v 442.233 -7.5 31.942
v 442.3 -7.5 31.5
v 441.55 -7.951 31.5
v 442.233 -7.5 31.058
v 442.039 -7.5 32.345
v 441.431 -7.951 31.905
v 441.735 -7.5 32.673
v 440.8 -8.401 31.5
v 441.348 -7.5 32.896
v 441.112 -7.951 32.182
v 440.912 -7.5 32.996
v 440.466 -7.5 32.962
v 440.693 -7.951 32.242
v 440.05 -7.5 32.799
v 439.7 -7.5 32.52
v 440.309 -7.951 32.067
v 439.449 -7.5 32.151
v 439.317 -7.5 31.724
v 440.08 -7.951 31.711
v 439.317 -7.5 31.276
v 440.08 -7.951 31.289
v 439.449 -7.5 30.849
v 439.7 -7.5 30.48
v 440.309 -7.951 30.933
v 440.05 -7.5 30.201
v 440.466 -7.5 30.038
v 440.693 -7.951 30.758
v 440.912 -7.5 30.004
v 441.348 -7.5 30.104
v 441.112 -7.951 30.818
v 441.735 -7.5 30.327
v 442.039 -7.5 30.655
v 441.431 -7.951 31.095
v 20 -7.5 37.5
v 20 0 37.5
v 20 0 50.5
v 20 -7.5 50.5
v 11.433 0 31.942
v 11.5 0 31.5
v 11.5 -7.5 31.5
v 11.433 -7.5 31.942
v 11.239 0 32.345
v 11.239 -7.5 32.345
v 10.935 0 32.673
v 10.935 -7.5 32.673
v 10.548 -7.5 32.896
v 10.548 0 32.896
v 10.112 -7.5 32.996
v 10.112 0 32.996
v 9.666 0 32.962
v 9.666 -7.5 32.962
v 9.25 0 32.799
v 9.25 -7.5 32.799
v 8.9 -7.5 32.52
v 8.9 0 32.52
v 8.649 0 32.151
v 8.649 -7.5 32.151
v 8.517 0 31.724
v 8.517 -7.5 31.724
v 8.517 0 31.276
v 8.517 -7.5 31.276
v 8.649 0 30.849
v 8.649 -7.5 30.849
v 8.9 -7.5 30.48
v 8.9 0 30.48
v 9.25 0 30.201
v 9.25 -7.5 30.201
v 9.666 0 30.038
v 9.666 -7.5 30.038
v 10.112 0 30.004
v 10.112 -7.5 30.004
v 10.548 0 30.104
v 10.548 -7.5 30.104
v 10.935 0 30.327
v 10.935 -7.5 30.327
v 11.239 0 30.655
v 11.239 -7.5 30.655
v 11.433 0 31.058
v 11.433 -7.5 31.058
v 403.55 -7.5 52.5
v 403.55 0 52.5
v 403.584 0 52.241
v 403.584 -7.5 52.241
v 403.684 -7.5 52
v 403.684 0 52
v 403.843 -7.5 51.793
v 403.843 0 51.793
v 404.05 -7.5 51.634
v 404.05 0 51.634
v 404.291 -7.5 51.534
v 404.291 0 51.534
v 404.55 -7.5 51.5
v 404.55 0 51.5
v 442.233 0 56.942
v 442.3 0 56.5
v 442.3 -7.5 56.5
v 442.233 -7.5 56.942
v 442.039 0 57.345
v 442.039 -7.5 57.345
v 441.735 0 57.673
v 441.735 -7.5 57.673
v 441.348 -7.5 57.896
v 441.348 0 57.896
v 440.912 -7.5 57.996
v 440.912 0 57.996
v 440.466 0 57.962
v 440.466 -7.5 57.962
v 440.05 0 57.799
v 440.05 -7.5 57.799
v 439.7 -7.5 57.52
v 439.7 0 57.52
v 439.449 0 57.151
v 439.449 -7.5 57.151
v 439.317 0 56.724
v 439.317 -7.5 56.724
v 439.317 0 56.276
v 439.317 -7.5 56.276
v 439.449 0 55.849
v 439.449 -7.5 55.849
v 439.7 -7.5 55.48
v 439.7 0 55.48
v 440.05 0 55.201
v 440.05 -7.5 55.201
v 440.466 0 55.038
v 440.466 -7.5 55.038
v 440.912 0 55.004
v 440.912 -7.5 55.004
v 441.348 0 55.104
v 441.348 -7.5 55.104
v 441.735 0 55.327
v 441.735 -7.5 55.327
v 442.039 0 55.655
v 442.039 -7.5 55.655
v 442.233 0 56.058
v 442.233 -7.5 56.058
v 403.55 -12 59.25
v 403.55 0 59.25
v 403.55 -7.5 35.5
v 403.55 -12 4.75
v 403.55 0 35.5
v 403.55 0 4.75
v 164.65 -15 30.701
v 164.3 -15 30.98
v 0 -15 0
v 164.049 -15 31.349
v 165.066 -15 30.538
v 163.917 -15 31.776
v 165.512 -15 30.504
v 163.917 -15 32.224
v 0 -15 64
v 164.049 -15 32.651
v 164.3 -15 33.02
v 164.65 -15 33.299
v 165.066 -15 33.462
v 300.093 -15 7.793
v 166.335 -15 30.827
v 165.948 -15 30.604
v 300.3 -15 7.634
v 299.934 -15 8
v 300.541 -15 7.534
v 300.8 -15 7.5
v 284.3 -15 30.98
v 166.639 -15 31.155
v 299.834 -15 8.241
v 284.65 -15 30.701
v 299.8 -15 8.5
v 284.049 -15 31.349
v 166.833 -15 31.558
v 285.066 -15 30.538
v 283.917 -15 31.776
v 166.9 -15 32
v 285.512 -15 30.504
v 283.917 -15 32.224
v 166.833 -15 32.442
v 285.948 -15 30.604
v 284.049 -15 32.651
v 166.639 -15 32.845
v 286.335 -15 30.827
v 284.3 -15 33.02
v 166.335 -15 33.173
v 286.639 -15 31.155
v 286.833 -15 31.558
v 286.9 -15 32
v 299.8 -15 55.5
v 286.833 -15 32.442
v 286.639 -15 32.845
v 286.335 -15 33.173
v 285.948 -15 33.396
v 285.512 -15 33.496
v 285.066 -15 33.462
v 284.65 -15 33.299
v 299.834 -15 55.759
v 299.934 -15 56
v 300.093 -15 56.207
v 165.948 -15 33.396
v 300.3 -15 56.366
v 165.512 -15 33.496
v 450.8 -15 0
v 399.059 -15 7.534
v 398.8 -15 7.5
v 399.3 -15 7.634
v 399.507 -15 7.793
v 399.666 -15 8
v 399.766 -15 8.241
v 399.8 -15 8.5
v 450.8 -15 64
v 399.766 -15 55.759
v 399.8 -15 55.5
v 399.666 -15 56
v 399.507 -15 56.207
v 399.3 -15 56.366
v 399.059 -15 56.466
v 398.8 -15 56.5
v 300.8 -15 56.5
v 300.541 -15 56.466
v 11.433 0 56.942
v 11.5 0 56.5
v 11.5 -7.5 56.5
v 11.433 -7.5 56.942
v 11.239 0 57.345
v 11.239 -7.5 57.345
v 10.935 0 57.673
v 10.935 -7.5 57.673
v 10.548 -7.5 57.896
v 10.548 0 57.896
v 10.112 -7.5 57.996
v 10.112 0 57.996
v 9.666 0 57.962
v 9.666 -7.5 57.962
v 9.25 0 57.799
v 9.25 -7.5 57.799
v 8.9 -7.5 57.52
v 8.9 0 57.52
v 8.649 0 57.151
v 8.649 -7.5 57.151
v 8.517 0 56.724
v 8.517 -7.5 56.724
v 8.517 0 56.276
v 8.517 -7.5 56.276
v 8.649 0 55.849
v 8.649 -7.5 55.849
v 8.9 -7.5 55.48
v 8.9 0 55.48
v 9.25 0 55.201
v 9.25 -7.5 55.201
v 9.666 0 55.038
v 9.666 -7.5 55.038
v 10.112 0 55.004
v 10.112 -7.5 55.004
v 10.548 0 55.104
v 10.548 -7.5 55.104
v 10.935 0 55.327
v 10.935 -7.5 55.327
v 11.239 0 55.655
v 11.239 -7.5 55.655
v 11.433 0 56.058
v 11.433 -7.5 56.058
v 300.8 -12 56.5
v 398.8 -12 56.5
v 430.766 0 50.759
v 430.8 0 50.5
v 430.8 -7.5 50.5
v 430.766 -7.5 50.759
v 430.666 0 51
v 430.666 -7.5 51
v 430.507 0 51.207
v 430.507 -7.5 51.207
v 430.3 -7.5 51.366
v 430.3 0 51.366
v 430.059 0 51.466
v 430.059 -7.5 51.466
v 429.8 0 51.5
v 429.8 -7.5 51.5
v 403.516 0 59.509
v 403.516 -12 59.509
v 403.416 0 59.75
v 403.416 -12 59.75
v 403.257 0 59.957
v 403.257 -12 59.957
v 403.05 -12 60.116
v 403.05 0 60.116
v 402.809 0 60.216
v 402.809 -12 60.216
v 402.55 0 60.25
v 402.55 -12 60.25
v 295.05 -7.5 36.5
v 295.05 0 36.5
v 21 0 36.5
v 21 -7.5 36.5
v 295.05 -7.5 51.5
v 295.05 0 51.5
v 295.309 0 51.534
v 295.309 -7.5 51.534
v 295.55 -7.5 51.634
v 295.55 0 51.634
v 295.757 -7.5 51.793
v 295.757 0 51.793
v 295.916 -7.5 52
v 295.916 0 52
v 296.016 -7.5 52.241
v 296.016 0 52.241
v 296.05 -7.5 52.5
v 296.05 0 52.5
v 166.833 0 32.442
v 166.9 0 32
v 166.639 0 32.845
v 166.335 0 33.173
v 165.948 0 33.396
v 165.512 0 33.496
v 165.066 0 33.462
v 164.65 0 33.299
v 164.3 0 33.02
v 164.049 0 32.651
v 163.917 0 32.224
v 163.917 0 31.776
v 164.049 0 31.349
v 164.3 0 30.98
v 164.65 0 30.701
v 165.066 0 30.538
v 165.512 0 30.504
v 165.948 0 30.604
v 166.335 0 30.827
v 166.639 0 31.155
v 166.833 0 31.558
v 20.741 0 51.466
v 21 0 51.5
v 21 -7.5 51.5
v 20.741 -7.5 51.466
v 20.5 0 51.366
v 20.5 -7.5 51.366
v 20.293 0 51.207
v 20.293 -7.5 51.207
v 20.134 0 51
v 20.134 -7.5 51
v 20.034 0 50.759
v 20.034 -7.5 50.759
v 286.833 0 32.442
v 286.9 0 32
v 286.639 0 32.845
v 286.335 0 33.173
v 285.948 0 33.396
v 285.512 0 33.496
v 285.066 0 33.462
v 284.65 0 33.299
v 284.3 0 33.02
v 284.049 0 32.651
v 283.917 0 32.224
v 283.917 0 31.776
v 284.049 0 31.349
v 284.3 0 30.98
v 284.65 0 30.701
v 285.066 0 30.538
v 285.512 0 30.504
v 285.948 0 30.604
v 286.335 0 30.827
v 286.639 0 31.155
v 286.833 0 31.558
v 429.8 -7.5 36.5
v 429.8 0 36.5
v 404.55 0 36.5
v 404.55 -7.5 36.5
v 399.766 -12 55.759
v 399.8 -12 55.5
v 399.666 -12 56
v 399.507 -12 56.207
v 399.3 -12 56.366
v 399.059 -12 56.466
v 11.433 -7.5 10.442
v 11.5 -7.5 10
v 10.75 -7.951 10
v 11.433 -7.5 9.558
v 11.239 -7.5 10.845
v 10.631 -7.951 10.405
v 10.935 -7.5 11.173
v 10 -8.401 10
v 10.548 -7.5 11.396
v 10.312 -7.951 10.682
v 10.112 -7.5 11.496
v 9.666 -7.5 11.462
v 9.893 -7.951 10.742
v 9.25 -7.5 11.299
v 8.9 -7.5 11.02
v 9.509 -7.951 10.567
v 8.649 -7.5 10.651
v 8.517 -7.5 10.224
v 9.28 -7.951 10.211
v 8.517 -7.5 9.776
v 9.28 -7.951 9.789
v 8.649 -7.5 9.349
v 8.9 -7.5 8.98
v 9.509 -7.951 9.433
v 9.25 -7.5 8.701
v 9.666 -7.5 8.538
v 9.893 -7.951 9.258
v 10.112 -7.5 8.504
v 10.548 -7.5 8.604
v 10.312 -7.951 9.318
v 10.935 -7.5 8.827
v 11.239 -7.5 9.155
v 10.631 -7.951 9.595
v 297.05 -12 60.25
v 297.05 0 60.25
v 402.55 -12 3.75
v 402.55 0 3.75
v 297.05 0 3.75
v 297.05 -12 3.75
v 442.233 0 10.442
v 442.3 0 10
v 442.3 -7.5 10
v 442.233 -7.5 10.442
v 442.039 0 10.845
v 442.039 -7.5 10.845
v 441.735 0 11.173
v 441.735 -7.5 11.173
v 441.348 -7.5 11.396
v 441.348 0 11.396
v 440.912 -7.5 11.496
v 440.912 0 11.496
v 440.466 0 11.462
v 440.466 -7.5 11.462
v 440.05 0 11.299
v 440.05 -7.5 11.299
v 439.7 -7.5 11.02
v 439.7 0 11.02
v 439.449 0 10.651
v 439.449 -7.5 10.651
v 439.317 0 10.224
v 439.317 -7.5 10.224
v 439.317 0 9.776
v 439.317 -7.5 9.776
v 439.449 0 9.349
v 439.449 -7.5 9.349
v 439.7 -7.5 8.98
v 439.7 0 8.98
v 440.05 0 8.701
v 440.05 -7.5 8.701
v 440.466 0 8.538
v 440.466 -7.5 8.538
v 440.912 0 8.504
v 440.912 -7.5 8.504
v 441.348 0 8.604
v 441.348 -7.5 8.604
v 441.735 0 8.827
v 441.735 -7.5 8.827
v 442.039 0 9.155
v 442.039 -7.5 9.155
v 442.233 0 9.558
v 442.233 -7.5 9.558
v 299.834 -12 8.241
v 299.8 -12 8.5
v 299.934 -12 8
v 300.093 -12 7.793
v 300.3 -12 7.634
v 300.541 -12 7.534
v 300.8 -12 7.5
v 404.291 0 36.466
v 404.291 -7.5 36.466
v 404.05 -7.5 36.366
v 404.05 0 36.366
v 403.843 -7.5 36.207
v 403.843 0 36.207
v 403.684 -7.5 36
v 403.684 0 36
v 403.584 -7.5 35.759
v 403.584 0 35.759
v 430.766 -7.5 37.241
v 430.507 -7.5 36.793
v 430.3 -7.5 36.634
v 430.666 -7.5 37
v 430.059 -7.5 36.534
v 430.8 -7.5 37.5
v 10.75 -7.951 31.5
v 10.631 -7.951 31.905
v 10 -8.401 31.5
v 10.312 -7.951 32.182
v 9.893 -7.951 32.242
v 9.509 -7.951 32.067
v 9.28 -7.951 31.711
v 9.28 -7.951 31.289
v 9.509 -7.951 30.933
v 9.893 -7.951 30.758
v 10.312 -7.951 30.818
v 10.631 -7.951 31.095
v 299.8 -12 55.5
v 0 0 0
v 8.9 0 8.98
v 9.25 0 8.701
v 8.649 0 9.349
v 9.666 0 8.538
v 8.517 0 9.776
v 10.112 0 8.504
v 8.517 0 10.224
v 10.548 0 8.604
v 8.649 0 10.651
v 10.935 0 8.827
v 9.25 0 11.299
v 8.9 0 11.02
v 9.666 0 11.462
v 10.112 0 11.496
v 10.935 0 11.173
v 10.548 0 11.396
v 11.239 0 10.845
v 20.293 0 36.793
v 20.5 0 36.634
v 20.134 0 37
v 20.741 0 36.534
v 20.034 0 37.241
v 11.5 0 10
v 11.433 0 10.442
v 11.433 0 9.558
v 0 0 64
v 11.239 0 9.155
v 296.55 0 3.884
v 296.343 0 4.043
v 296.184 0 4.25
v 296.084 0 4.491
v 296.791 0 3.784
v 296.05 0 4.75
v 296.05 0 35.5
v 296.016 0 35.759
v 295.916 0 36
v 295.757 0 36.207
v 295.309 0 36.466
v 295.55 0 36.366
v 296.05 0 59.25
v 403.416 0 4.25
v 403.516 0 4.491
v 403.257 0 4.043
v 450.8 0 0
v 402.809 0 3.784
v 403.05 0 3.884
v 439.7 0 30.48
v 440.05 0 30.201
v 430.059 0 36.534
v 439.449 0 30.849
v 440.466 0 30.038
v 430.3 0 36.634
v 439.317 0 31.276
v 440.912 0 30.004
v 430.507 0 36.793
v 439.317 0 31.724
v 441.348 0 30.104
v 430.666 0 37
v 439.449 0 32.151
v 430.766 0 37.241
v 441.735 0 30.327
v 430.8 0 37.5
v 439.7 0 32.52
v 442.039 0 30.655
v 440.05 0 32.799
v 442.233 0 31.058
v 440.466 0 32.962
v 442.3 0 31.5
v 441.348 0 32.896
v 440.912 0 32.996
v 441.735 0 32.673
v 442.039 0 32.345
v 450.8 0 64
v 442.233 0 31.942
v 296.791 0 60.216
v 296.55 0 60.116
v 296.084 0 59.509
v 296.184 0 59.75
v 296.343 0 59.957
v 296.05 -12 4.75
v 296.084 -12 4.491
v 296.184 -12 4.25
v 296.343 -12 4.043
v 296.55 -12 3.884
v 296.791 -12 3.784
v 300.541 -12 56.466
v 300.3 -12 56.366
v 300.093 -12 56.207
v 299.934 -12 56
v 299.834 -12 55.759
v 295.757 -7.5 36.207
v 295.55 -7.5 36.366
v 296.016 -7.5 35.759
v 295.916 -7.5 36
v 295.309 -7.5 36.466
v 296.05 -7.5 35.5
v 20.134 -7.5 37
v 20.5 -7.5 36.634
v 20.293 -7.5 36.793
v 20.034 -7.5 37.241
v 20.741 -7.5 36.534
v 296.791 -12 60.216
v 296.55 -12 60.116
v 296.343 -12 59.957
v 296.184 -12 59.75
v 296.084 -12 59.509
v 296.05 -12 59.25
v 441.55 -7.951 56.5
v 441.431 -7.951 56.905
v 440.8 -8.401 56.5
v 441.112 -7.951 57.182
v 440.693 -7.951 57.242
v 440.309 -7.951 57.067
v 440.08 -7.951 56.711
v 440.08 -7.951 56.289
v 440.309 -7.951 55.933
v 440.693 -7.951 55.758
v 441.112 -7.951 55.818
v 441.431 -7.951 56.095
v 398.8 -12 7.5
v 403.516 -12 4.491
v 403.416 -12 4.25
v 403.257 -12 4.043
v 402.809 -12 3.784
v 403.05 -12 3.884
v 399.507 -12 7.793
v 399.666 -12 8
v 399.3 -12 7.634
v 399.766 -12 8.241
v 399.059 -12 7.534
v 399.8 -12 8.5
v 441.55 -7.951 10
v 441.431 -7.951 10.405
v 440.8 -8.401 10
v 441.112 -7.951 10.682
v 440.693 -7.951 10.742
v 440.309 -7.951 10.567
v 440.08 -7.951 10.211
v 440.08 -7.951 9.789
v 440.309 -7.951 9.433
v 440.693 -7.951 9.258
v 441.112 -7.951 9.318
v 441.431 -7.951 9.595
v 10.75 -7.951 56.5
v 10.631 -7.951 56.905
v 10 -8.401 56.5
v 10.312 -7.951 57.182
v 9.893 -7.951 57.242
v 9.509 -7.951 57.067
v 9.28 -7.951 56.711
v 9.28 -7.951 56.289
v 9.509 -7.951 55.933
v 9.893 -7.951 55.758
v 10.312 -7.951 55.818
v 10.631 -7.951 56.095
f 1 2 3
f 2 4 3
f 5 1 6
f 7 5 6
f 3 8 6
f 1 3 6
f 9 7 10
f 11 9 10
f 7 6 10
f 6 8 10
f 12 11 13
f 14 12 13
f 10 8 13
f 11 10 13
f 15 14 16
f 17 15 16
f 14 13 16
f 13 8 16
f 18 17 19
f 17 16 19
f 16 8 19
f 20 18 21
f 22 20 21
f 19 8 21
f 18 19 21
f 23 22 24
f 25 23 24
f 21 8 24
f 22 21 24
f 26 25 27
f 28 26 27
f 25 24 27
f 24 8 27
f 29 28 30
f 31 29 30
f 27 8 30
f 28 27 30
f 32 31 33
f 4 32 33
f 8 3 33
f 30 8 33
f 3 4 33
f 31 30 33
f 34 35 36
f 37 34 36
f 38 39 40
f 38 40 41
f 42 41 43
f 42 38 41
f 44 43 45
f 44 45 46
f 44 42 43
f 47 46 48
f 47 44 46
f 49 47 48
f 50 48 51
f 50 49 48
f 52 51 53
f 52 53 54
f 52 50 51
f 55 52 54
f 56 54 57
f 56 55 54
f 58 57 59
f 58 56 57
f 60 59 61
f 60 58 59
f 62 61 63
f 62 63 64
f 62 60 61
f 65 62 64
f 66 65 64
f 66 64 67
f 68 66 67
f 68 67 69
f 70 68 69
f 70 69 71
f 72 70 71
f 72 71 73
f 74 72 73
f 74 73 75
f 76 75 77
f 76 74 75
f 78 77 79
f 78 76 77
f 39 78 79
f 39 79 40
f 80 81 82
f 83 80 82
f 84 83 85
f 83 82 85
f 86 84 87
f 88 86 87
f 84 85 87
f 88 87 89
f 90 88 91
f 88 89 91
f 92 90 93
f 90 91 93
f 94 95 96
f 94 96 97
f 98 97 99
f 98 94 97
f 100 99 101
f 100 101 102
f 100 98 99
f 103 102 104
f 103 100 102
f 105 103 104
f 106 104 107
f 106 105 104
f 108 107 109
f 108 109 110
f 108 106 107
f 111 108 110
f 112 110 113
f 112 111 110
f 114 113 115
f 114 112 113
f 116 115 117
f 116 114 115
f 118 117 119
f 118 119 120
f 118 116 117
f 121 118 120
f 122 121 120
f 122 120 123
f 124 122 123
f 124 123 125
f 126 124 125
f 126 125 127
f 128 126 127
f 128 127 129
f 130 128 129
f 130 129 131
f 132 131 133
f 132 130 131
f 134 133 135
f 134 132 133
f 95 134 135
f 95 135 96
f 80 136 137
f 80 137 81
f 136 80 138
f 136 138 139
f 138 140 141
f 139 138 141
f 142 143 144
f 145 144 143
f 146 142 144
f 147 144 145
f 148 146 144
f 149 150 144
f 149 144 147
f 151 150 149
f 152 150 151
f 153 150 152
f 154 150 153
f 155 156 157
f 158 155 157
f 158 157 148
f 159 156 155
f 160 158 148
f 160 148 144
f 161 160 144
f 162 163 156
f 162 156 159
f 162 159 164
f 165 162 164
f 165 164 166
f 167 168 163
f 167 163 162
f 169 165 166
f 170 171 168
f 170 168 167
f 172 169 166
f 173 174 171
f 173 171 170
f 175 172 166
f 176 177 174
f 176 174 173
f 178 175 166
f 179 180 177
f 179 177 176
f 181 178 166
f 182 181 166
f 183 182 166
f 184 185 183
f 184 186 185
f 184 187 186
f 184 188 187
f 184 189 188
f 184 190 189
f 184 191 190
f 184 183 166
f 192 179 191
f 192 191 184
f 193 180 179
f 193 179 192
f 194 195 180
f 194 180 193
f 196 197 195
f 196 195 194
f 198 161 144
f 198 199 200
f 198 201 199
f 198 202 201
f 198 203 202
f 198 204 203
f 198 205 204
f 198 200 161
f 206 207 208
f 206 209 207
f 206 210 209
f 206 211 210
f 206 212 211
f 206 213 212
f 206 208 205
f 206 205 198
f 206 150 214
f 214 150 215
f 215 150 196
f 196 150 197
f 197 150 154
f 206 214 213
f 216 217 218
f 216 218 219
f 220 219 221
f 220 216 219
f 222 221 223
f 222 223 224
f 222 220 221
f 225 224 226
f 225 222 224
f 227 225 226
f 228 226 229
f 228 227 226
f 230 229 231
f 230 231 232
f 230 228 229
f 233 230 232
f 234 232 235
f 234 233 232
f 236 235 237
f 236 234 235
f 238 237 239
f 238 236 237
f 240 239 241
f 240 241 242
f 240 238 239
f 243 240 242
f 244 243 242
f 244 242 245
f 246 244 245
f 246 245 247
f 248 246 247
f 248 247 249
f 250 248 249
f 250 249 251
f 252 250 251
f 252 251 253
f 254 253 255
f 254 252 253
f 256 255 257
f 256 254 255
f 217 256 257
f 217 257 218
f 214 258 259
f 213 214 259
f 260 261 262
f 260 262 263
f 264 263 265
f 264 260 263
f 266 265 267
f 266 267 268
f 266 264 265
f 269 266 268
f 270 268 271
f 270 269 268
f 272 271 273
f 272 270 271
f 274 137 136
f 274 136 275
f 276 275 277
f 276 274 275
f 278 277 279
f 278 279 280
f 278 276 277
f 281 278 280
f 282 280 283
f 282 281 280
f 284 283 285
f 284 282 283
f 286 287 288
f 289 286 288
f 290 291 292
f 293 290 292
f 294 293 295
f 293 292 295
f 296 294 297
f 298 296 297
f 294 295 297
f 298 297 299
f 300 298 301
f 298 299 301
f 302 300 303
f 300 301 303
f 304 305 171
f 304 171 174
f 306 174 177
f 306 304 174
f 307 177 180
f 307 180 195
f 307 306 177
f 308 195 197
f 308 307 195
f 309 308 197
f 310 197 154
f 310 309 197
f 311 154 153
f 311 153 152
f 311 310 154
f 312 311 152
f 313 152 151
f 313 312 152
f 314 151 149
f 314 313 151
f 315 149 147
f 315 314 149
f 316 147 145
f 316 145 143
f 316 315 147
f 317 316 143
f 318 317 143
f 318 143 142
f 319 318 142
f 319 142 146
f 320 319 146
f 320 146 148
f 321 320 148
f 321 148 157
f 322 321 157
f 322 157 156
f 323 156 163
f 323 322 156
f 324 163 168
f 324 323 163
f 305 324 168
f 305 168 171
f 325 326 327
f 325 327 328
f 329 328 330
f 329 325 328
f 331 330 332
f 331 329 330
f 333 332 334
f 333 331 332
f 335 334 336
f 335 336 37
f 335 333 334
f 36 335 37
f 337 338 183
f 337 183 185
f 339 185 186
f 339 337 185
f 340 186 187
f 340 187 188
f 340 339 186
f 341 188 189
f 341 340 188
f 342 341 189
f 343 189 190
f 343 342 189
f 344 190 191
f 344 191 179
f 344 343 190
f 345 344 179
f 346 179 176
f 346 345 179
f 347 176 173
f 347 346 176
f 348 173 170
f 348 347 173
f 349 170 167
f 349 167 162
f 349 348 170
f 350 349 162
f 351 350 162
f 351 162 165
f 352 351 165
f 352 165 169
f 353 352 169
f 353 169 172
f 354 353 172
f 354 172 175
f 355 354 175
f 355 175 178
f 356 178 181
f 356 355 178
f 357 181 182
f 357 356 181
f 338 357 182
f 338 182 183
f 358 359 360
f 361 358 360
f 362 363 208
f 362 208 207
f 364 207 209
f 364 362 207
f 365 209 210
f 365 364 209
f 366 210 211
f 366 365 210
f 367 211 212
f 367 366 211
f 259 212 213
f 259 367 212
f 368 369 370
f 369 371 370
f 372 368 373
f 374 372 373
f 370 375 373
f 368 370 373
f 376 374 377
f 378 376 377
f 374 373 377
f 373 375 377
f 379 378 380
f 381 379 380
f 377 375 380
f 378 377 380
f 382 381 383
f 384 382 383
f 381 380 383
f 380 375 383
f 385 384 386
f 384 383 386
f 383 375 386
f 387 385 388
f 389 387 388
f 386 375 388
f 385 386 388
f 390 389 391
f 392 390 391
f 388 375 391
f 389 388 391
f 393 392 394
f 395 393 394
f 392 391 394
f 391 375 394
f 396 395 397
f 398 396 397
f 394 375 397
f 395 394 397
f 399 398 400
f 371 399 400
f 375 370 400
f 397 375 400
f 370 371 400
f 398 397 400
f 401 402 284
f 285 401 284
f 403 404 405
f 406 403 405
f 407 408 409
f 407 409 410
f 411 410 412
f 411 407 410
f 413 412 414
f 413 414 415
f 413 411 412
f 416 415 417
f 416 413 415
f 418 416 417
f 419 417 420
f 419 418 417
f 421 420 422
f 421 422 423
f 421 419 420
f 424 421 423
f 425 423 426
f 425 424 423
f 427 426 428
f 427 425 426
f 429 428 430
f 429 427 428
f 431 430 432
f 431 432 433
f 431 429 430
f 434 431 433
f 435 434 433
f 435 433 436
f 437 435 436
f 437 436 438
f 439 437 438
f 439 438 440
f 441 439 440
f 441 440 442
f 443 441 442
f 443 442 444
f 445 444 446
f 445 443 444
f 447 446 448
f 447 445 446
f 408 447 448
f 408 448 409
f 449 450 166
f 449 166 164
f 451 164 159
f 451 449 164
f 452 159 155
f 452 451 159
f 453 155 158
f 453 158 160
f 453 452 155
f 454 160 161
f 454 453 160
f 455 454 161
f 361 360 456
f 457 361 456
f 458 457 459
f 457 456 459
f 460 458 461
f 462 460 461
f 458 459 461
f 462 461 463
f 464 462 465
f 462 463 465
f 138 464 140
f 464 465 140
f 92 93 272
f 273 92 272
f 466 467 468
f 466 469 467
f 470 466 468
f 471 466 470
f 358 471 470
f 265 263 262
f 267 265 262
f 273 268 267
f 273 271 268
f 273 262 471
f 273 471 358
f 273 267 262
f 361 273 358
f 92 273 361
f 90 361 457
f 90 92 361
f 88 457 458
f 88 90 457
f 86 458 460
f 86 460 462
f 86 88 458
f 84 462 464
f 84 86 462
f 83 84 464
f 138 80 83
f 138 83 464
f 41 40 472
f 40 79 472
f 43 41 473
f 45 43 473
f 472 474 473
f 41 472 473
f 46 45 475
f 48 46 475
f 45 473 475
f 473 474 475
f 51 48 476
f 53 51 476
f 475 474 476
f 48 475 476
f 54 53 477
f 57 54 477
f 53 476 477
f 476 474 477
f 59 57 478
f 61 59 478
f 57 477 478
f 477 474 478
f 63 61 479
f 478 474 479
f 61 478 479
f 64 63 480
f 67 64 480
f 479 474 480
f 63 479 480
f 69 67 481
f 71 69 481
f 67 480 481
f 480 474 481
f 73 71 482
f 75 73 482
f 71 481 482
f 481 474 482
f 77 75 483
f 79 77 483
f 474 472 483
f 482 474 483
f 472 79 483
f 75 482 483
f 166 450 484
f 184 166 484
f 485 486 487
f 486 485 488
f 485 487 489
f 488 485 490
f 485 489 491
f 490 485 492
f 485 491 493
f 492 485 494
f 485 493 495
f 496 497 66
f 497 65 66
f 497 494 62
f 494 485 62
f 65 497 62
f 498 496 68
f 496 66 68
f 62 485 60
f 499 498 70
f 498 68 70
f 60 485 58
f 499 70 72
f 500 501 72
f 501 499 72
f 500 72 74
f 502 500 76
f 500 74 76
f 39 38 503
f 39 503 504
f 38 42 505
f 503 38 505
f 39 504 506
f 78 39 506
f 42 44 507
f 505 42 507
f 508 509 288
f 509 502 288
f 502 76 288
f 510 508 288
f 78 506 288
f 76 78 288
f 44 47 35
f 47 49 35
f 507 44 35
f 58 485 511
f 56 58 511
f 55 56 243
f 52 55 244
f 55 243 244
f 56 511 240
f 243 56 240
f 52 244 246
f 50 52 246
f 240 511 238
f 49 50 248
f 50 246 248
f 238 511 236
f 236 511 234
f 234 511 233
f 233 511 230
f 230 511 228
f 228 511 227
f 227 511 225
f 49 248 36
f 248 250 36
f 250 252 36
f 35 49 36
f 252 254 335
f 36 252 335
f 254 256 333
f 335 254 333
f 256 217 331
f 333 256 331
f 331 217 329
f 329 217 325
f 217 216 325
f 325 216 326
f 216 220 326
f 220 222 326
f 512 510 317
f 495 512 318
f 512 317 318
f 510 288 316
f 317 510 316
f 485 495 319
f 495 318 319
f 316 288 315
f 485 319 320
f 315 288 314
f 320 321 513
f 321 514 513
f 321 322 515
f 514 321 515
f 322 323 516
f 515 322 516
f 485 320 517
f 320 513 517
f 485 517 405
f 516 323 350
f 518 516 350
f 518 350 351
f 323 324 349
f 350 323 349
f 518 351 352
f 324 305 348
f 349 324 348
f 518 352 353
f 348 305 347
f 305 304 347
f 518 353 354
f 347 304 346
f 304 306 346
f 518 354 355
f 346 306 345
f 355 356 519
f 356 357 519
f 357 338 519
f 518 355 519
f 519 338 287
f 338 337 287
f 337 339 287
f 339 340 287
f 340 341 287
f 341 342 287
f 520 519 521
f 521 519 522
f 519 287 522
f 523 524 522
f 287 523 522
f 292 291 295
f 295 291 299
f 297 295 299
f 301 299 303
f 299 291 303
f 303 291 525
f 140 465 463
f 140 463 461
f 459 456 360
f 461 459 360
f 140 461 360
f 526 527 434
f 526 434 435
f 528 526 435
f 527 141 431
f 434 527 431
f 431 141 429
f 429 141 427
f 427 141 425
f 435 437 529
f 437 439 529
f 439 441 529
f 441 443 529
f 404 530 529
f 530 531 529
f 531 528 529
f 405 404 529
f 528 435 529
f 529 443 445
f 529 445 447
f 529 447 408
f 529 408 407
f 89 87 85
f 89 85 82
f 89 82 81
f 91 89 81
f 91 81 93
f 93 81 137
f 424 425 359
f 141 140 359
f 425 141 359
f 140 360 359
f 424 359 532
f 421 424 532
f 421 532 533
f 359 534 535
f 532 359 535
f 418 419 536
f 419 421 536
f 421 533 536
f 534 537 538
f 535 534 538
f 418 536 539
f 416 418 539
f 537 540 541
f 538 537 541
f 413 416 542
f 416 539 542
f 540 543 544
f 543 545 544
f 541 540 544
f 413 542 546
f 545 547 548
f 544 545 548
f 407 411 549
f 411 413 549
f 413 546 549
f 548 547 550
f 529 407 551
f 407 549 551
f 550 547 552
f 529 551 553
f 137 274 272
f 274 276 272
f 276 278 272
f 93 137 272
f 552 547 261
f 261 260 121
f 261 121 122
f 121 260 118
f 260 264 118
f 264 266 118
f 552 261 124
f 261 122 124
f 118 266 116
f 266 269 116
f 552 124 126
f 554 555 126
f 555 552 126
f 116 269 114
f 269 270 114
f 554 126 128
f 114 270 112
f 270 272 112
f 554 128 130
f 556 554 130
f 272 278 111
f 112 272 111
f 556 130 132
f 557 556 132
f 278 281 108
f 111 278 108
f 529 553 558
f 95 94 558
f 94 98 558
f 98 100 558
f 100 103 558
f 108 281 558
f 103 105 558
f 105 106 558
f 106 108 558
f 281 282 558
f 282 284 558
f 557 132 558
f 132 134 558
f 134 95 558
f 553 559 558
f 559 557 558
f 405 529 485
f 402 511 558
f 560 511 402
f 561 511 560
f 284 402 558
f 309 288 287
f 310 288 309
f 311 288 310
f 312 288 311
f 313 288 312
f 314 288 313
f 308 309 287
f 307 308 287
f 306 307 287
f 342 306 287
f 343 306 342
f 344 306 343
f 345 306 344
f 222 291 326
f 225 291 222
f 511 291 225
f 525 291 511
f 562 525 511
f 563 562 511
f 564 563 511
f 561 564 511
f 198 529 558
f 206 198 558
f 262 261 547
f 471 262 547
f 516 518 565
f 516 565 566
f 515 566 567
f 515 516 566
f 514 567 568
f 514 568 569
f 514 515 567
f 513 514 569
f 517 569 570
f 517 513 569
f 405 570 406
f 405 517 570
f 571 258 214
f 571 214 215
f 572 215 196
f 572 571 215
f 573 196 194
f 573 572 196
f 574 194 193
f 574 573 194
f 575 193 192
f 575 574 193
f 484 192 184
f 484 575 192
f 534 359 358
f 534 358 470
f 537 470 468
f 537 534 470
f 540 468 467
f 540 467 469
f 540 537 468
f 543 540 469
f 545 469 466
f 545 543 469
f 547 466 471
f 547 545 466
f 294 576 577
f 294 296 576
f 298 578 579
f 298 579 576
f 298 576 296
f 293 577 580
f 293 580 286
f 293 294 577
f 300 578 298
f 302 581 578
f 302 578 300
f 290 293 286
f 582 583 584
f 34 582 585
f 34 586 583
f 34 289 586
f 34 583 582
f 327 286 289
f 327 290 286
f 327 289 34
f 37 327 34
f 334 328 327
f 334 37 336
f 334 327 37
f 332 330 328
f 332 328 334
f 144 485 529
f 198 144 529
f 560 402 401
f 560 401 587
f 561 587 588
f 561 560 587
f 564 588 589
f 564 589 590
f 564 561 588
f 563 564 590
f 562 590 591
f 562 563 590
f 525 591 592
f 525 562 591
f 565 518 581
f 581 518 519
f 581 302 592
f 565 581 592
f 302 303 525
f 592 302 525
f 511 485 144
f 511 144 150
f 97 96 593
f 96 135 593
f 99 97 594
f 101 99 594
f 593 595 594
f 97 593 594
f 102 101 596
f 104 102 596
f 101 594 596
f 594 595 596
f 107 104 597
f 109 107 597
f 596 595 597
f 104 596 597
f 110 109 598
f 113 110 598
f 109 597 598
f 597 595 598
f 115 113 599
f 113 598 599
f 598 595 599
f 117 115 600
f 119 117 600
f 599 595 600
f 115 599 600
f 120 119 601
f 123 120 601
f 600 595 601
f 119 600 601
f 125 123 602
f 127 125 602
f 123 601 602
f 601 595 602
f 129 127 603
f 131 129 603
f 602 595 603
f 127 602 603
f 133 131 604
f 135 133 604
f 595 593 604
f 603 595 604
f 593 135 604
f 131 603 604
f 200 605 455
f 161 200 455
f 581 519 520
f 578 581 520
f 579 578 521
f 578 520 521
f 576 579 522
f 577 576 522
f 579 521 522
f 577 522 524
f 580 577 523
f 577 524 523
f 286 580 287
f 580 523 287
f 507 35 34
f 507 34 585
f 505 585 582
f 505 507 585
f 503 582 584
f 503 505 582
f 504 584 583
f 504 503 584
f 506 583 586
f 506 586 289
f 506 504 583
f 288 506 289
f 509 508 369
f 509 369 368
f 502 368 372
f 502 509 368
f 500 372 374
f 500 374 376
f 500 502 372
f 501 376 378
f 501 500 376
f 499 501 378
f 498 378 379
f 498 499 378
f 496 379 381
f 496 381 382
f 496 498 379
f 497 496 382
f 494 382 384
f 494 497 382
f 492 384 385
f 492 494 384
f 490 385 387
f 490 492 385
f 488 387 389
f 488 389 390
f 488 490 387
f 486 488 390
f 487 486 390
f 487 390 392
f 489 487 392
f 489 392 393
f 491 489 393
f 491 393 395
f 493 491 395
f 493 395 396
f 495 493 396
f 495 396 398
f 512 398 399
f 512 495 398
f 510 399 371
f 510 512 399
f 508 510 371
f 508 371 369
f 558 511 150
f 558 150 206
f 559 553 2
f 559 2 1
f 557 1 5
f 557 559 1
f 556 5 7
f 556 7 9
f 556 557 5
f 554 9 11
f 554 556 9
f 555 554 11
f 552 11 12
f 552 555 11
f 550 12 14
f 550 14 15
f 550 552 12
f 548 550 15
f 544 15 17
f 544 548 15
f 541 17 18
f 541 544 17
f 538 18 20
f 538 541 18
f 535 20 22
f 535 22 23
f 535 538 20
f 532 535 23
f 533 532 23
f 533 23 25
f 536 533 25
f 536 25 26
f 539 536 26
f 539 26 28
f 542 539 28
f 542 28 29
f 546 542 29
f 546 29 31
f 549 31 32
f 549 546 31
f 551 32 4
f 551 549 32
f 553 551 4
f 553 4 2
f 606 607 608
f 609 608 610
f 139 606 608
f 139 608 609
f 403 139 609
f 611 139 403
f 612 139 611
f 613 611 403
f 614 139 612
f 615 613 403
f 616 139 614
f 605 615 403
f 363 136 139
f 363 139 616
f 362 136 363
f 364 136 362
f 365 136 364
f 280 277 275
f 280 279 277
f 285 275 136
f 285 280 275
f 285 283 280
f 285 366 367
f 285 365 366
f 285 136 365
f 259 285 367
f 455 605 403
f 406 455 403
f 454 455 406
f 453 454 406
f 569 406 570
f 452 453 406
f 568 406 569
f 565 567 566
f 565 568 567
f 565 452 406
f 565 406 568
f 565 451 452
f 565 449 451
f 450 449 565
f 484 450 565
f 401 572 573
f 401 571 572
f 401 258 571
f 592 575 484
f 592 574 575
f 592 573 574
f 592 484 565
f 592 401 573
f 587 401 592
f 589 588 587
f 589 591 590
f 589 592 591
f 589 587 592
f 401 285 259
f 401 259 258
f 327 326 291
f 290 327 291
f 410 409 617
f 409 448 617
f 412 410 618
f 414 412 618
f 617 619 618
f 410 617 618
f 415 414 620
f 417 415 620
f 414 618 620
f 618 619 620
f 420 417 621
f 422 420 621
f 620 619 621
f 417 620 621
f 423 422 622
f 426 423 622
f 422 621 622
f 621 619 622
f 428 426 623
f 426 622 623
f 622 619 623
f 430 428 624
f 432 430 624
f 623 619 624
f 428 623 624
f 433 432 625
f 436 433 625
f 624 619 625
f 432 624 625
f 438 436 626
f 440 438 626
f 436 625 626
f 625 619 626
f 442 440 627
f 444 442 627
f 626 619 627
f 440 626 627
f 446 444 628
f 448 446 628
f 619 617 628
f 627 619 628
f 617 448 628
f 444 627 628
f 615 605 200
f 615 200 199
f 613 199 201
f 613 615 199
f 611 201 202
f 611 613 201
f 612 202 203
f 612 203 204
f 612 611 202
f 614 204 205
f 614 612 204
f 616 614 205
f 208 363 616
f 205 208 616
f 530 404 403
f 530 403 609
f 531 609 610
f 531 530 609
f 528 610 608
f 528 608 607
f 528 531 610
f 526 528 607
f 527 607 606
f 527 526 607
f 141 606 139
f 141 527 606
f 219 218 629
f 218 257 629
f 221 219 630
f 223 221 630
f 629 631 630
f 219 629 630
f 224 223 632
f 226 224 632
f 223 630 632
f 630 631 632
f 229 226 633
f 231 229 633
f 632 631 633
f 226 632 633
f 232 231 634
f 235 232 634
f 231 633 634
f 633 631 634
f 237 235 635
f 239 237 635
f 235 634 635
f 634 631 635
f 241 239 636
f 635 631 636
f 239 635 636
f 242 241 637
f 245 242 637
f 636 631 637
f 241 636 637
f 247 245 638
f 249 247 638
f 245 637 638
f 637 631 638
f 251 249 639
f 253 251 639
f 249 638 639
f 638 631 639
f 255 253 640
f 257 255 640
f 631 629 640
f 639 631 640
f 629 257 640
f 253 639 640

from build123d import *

# Parameters (mm, degrees)
SKETCH_W        = 450.8
SKETCH_H        = 64
SKETCH_R        = 1.5
PAD_DEPTH       = 15
POCKET_DEPTH    = 12
POCKET001_DEPTH = 7.5
SKETCH003_R     = 1.5
HOLE_DEPTH      = 7.5
HOLE_TIPS_R     = 1.5


with BuildPart() as part:
    # Sketch → Pad (new body)
    with BuildSketch(Plane.XZ):
        with Locations((225.4, 32)):
            Rectangle(SKETCH_W, SKETCH_H)
        with Locations((165.4, 32)):
            Circle(SKETCH_R, mode=Mode.SUBTRACT)
        with Locations((285.4, 32)):
            Circle(SKETCH_R, mode=Mode.SUBTRACT)
        with BuildLine():
            Line((300.8, 56.5), (398.8, 56.5))
            ThreePointArc((399.8, 55.5), (399.507107, 56.207107), (398.8, 56.5))
            Line((399.8, 55.5), (399.8, 8.5))
            ThreePointArc((398.8, 7.5), (399.507107, 7.792893), (399.8, 8.5))
            Line((398.8, 7.5), (300.8, 7.5))
            ThreePointArc((299.8, 8.5), (300.092893, 7.792893), (300.8, 7.5))
            Line((299.8, 8.5), (299.8, 55.5))
            ThreePointArc((300.8, 56.5), (300.092893, 56.207107), (299.8, 55.5))
        make_face(mode=Mode.SUBTRACT)
    extrude(amount=PAD_DEPTH)

    # Sketch001 (on DatumPlane) → Pocket (cut)
    with BuildSketch(Plane.XZ):
        with BuildLine():
            Line((297.05, 60.25), (402.55, 60.25))
            ThreePointArc((403.55, 59.25), (403.257107, 59.957107), (402.55, 60.25))
            Line((403.55, 59.25), (403.55, 4.75))
            ThreePointArc((402.55, 3.75), (403.257107, 4.042893), (403.55, 4.75))
            Line((402.55, 3.75), (297.05, 3.75))
            ThreePointArc((296.05, 4.75), (296.342893, 4.042893), (297.05, 3.75))
            Line((296.05, 4.75), (296.05, 59.25))
            ThreePointArc((297.05, 60.25), (296.342893, 59.957107), (296.05, 59.25))
        make_face()
    extrude(amount=POCKET_DEPTH, mode=Mode.SUBTRACT)

    # Sketch002 (on DatumPlane) → Pocket001 (cut)
    with BuildSketch(Plane.XZ):
        with BuildLine():
            Line((21, 51.5), (295.05, 51.5))
            ThreePointArc((295.05, 51.5), (295.757107, 51.792893), (296.05, 52.5))
            Line((296.05, 52.5), (403.55, 52.5))
            ThreePointArc((403.55, 52.5), (403.842893, 51.792893), (404.55, 51.5))
            Line((404.55, 51.5), (429.8, 51.5))
            ThreePointArc((430.8, 50.5), (430.507107, 51.207107), (429.8, 51.5))
            Line((430.8, 50.5), (430.8, 37.5))
            ThreePointArc((429.8, 36.5), (430.507107, 36.792893), (430.8, 37.5))
            Line((429.8, 36.5), (404.55, 36.5))
            ThreePointArc((404.55, 36.5), (403.842893, 36.207107), (403.55, 35.5))
            Line((296.05, 35.5), (403.55, 35.5))
            ThreePointArc((296.05, 35.5), (295.757107, 36.207107), (295.05, 36.5))
            Line((295.05, 36.5), (21, 36.5))
            ThreePointArc((20, 37.5), (20.292893, 36.792893), (21, 36.5))
            Line((20, 37.5), (20, 50.5))
            ThreePointArc((21, 51.5), (20.292893, 51.207107), (20, 50.5))
        make_face()
    extrude(amount=POCKET001_DEPTH, mode=Mode.SUBTRACT)

    # Sketch003 (on DatumPlane) → Hole (cut)
    with BuildSketch(Plane.XZ):
        with Locations((10, 56.5)):
            Circle(SKETCH003_R)
        with Locations((10, 31.5)):
            Circle(SKETCH003_R)
        with Locations((10, 10)):
            Circle(SKETCH003_R)
        with Locations((440.8, 56.5)):
            Circle(SKETCH003_R)
        with Locations((440.8, 31.5)):
            Circle(SKETCH003_R)
        with Locations((440.8, 10)):
            Circle(SKETCH003_R)
    extrude(amount=HOLE_DEPTH, mode=Mode.SUBTRACT)

    # Hole tips → Hole tip 1 section 0
    with BuildSketch(Plane.XZ.offset(7.5), mode=Mode.PRIVATE) as hole_tip_1_s0:
        with Locations((10, 56.5)):
            Circle(HOLE_TIPS_R)
    loft([hole_tip_1_s0.sketch, Vertex(10, -8.401291, 56.5)], mode=Mode.SUBTRACT)

    # Hole tips → Hole tip 2 section 0
    with BuildSketch(Plane.XZ.offset(7.5), mode=Mode.PRIVATE) as hole_tip_2_s0:
        with Locations((10, 31.5)):
            Circle(HOLE_TIPS_R)
    loft([hole_tip_2_s0.sketch, Vertex(10, -8.401291, 31.5)], mode=Mode.SUBTRACT)

    # Hole tips → Hole tip 3 section 0
    with BuildSketch(Plane.XZ.offset(7.5), mode=Mode.PRIVATE) as hole_tip_3_s0:
        with Locations((10, 10)):
            Circle(HOLE_TIPS_R)
    loft([hole_tip_3_s0.sketch, Vertex(10, -8.401291, 10)], mode=Mode.SUBTRACT)

    # Hole tips → Hole tip 4 section 0
    with BuildSketch(Plane.XZ.offset(7.5), mode=Mode.PRIVATE) as hole_tip_4_s0:
        with Locations((440.8, 56.5)):
            Circle(HOLE_TIPS_R)
    loft([hole_tip_4_s0.sketch, Vertex(440.8, -8.401291, 56.5)], mode=Mode.SUBTRACT)

    # Hole tips → Hole tip 5 section 0
    with BuildSketch(Plane.XZ.offset(7.5), mode=Mode.PRIVATE) as hole_tip_5_s0:
        with Locations((440.8, 31.5)):
            Circle(HOLE_TIPS_R)
    loft([hole_tip_5_s0.sketch, Vertex(440.8, -8.401291, 31.5)], mode=Mode.SUBTRACT)

    # Hole tips → Hole tip 6 section 0
    with BuildSketch(Plane.XZ.offset(7.5), mode=Mode.PRIVATE) as hole_tip_6_s0:
        with Locations((440.8, 10)):
            Circle(HOLE_TIPS_R)
    loft([hole_tip_6_s0.sketch, Vertex(440.8, -8.401291, 10)], mode=Mode.SUBTRACT)


solid = part.part
